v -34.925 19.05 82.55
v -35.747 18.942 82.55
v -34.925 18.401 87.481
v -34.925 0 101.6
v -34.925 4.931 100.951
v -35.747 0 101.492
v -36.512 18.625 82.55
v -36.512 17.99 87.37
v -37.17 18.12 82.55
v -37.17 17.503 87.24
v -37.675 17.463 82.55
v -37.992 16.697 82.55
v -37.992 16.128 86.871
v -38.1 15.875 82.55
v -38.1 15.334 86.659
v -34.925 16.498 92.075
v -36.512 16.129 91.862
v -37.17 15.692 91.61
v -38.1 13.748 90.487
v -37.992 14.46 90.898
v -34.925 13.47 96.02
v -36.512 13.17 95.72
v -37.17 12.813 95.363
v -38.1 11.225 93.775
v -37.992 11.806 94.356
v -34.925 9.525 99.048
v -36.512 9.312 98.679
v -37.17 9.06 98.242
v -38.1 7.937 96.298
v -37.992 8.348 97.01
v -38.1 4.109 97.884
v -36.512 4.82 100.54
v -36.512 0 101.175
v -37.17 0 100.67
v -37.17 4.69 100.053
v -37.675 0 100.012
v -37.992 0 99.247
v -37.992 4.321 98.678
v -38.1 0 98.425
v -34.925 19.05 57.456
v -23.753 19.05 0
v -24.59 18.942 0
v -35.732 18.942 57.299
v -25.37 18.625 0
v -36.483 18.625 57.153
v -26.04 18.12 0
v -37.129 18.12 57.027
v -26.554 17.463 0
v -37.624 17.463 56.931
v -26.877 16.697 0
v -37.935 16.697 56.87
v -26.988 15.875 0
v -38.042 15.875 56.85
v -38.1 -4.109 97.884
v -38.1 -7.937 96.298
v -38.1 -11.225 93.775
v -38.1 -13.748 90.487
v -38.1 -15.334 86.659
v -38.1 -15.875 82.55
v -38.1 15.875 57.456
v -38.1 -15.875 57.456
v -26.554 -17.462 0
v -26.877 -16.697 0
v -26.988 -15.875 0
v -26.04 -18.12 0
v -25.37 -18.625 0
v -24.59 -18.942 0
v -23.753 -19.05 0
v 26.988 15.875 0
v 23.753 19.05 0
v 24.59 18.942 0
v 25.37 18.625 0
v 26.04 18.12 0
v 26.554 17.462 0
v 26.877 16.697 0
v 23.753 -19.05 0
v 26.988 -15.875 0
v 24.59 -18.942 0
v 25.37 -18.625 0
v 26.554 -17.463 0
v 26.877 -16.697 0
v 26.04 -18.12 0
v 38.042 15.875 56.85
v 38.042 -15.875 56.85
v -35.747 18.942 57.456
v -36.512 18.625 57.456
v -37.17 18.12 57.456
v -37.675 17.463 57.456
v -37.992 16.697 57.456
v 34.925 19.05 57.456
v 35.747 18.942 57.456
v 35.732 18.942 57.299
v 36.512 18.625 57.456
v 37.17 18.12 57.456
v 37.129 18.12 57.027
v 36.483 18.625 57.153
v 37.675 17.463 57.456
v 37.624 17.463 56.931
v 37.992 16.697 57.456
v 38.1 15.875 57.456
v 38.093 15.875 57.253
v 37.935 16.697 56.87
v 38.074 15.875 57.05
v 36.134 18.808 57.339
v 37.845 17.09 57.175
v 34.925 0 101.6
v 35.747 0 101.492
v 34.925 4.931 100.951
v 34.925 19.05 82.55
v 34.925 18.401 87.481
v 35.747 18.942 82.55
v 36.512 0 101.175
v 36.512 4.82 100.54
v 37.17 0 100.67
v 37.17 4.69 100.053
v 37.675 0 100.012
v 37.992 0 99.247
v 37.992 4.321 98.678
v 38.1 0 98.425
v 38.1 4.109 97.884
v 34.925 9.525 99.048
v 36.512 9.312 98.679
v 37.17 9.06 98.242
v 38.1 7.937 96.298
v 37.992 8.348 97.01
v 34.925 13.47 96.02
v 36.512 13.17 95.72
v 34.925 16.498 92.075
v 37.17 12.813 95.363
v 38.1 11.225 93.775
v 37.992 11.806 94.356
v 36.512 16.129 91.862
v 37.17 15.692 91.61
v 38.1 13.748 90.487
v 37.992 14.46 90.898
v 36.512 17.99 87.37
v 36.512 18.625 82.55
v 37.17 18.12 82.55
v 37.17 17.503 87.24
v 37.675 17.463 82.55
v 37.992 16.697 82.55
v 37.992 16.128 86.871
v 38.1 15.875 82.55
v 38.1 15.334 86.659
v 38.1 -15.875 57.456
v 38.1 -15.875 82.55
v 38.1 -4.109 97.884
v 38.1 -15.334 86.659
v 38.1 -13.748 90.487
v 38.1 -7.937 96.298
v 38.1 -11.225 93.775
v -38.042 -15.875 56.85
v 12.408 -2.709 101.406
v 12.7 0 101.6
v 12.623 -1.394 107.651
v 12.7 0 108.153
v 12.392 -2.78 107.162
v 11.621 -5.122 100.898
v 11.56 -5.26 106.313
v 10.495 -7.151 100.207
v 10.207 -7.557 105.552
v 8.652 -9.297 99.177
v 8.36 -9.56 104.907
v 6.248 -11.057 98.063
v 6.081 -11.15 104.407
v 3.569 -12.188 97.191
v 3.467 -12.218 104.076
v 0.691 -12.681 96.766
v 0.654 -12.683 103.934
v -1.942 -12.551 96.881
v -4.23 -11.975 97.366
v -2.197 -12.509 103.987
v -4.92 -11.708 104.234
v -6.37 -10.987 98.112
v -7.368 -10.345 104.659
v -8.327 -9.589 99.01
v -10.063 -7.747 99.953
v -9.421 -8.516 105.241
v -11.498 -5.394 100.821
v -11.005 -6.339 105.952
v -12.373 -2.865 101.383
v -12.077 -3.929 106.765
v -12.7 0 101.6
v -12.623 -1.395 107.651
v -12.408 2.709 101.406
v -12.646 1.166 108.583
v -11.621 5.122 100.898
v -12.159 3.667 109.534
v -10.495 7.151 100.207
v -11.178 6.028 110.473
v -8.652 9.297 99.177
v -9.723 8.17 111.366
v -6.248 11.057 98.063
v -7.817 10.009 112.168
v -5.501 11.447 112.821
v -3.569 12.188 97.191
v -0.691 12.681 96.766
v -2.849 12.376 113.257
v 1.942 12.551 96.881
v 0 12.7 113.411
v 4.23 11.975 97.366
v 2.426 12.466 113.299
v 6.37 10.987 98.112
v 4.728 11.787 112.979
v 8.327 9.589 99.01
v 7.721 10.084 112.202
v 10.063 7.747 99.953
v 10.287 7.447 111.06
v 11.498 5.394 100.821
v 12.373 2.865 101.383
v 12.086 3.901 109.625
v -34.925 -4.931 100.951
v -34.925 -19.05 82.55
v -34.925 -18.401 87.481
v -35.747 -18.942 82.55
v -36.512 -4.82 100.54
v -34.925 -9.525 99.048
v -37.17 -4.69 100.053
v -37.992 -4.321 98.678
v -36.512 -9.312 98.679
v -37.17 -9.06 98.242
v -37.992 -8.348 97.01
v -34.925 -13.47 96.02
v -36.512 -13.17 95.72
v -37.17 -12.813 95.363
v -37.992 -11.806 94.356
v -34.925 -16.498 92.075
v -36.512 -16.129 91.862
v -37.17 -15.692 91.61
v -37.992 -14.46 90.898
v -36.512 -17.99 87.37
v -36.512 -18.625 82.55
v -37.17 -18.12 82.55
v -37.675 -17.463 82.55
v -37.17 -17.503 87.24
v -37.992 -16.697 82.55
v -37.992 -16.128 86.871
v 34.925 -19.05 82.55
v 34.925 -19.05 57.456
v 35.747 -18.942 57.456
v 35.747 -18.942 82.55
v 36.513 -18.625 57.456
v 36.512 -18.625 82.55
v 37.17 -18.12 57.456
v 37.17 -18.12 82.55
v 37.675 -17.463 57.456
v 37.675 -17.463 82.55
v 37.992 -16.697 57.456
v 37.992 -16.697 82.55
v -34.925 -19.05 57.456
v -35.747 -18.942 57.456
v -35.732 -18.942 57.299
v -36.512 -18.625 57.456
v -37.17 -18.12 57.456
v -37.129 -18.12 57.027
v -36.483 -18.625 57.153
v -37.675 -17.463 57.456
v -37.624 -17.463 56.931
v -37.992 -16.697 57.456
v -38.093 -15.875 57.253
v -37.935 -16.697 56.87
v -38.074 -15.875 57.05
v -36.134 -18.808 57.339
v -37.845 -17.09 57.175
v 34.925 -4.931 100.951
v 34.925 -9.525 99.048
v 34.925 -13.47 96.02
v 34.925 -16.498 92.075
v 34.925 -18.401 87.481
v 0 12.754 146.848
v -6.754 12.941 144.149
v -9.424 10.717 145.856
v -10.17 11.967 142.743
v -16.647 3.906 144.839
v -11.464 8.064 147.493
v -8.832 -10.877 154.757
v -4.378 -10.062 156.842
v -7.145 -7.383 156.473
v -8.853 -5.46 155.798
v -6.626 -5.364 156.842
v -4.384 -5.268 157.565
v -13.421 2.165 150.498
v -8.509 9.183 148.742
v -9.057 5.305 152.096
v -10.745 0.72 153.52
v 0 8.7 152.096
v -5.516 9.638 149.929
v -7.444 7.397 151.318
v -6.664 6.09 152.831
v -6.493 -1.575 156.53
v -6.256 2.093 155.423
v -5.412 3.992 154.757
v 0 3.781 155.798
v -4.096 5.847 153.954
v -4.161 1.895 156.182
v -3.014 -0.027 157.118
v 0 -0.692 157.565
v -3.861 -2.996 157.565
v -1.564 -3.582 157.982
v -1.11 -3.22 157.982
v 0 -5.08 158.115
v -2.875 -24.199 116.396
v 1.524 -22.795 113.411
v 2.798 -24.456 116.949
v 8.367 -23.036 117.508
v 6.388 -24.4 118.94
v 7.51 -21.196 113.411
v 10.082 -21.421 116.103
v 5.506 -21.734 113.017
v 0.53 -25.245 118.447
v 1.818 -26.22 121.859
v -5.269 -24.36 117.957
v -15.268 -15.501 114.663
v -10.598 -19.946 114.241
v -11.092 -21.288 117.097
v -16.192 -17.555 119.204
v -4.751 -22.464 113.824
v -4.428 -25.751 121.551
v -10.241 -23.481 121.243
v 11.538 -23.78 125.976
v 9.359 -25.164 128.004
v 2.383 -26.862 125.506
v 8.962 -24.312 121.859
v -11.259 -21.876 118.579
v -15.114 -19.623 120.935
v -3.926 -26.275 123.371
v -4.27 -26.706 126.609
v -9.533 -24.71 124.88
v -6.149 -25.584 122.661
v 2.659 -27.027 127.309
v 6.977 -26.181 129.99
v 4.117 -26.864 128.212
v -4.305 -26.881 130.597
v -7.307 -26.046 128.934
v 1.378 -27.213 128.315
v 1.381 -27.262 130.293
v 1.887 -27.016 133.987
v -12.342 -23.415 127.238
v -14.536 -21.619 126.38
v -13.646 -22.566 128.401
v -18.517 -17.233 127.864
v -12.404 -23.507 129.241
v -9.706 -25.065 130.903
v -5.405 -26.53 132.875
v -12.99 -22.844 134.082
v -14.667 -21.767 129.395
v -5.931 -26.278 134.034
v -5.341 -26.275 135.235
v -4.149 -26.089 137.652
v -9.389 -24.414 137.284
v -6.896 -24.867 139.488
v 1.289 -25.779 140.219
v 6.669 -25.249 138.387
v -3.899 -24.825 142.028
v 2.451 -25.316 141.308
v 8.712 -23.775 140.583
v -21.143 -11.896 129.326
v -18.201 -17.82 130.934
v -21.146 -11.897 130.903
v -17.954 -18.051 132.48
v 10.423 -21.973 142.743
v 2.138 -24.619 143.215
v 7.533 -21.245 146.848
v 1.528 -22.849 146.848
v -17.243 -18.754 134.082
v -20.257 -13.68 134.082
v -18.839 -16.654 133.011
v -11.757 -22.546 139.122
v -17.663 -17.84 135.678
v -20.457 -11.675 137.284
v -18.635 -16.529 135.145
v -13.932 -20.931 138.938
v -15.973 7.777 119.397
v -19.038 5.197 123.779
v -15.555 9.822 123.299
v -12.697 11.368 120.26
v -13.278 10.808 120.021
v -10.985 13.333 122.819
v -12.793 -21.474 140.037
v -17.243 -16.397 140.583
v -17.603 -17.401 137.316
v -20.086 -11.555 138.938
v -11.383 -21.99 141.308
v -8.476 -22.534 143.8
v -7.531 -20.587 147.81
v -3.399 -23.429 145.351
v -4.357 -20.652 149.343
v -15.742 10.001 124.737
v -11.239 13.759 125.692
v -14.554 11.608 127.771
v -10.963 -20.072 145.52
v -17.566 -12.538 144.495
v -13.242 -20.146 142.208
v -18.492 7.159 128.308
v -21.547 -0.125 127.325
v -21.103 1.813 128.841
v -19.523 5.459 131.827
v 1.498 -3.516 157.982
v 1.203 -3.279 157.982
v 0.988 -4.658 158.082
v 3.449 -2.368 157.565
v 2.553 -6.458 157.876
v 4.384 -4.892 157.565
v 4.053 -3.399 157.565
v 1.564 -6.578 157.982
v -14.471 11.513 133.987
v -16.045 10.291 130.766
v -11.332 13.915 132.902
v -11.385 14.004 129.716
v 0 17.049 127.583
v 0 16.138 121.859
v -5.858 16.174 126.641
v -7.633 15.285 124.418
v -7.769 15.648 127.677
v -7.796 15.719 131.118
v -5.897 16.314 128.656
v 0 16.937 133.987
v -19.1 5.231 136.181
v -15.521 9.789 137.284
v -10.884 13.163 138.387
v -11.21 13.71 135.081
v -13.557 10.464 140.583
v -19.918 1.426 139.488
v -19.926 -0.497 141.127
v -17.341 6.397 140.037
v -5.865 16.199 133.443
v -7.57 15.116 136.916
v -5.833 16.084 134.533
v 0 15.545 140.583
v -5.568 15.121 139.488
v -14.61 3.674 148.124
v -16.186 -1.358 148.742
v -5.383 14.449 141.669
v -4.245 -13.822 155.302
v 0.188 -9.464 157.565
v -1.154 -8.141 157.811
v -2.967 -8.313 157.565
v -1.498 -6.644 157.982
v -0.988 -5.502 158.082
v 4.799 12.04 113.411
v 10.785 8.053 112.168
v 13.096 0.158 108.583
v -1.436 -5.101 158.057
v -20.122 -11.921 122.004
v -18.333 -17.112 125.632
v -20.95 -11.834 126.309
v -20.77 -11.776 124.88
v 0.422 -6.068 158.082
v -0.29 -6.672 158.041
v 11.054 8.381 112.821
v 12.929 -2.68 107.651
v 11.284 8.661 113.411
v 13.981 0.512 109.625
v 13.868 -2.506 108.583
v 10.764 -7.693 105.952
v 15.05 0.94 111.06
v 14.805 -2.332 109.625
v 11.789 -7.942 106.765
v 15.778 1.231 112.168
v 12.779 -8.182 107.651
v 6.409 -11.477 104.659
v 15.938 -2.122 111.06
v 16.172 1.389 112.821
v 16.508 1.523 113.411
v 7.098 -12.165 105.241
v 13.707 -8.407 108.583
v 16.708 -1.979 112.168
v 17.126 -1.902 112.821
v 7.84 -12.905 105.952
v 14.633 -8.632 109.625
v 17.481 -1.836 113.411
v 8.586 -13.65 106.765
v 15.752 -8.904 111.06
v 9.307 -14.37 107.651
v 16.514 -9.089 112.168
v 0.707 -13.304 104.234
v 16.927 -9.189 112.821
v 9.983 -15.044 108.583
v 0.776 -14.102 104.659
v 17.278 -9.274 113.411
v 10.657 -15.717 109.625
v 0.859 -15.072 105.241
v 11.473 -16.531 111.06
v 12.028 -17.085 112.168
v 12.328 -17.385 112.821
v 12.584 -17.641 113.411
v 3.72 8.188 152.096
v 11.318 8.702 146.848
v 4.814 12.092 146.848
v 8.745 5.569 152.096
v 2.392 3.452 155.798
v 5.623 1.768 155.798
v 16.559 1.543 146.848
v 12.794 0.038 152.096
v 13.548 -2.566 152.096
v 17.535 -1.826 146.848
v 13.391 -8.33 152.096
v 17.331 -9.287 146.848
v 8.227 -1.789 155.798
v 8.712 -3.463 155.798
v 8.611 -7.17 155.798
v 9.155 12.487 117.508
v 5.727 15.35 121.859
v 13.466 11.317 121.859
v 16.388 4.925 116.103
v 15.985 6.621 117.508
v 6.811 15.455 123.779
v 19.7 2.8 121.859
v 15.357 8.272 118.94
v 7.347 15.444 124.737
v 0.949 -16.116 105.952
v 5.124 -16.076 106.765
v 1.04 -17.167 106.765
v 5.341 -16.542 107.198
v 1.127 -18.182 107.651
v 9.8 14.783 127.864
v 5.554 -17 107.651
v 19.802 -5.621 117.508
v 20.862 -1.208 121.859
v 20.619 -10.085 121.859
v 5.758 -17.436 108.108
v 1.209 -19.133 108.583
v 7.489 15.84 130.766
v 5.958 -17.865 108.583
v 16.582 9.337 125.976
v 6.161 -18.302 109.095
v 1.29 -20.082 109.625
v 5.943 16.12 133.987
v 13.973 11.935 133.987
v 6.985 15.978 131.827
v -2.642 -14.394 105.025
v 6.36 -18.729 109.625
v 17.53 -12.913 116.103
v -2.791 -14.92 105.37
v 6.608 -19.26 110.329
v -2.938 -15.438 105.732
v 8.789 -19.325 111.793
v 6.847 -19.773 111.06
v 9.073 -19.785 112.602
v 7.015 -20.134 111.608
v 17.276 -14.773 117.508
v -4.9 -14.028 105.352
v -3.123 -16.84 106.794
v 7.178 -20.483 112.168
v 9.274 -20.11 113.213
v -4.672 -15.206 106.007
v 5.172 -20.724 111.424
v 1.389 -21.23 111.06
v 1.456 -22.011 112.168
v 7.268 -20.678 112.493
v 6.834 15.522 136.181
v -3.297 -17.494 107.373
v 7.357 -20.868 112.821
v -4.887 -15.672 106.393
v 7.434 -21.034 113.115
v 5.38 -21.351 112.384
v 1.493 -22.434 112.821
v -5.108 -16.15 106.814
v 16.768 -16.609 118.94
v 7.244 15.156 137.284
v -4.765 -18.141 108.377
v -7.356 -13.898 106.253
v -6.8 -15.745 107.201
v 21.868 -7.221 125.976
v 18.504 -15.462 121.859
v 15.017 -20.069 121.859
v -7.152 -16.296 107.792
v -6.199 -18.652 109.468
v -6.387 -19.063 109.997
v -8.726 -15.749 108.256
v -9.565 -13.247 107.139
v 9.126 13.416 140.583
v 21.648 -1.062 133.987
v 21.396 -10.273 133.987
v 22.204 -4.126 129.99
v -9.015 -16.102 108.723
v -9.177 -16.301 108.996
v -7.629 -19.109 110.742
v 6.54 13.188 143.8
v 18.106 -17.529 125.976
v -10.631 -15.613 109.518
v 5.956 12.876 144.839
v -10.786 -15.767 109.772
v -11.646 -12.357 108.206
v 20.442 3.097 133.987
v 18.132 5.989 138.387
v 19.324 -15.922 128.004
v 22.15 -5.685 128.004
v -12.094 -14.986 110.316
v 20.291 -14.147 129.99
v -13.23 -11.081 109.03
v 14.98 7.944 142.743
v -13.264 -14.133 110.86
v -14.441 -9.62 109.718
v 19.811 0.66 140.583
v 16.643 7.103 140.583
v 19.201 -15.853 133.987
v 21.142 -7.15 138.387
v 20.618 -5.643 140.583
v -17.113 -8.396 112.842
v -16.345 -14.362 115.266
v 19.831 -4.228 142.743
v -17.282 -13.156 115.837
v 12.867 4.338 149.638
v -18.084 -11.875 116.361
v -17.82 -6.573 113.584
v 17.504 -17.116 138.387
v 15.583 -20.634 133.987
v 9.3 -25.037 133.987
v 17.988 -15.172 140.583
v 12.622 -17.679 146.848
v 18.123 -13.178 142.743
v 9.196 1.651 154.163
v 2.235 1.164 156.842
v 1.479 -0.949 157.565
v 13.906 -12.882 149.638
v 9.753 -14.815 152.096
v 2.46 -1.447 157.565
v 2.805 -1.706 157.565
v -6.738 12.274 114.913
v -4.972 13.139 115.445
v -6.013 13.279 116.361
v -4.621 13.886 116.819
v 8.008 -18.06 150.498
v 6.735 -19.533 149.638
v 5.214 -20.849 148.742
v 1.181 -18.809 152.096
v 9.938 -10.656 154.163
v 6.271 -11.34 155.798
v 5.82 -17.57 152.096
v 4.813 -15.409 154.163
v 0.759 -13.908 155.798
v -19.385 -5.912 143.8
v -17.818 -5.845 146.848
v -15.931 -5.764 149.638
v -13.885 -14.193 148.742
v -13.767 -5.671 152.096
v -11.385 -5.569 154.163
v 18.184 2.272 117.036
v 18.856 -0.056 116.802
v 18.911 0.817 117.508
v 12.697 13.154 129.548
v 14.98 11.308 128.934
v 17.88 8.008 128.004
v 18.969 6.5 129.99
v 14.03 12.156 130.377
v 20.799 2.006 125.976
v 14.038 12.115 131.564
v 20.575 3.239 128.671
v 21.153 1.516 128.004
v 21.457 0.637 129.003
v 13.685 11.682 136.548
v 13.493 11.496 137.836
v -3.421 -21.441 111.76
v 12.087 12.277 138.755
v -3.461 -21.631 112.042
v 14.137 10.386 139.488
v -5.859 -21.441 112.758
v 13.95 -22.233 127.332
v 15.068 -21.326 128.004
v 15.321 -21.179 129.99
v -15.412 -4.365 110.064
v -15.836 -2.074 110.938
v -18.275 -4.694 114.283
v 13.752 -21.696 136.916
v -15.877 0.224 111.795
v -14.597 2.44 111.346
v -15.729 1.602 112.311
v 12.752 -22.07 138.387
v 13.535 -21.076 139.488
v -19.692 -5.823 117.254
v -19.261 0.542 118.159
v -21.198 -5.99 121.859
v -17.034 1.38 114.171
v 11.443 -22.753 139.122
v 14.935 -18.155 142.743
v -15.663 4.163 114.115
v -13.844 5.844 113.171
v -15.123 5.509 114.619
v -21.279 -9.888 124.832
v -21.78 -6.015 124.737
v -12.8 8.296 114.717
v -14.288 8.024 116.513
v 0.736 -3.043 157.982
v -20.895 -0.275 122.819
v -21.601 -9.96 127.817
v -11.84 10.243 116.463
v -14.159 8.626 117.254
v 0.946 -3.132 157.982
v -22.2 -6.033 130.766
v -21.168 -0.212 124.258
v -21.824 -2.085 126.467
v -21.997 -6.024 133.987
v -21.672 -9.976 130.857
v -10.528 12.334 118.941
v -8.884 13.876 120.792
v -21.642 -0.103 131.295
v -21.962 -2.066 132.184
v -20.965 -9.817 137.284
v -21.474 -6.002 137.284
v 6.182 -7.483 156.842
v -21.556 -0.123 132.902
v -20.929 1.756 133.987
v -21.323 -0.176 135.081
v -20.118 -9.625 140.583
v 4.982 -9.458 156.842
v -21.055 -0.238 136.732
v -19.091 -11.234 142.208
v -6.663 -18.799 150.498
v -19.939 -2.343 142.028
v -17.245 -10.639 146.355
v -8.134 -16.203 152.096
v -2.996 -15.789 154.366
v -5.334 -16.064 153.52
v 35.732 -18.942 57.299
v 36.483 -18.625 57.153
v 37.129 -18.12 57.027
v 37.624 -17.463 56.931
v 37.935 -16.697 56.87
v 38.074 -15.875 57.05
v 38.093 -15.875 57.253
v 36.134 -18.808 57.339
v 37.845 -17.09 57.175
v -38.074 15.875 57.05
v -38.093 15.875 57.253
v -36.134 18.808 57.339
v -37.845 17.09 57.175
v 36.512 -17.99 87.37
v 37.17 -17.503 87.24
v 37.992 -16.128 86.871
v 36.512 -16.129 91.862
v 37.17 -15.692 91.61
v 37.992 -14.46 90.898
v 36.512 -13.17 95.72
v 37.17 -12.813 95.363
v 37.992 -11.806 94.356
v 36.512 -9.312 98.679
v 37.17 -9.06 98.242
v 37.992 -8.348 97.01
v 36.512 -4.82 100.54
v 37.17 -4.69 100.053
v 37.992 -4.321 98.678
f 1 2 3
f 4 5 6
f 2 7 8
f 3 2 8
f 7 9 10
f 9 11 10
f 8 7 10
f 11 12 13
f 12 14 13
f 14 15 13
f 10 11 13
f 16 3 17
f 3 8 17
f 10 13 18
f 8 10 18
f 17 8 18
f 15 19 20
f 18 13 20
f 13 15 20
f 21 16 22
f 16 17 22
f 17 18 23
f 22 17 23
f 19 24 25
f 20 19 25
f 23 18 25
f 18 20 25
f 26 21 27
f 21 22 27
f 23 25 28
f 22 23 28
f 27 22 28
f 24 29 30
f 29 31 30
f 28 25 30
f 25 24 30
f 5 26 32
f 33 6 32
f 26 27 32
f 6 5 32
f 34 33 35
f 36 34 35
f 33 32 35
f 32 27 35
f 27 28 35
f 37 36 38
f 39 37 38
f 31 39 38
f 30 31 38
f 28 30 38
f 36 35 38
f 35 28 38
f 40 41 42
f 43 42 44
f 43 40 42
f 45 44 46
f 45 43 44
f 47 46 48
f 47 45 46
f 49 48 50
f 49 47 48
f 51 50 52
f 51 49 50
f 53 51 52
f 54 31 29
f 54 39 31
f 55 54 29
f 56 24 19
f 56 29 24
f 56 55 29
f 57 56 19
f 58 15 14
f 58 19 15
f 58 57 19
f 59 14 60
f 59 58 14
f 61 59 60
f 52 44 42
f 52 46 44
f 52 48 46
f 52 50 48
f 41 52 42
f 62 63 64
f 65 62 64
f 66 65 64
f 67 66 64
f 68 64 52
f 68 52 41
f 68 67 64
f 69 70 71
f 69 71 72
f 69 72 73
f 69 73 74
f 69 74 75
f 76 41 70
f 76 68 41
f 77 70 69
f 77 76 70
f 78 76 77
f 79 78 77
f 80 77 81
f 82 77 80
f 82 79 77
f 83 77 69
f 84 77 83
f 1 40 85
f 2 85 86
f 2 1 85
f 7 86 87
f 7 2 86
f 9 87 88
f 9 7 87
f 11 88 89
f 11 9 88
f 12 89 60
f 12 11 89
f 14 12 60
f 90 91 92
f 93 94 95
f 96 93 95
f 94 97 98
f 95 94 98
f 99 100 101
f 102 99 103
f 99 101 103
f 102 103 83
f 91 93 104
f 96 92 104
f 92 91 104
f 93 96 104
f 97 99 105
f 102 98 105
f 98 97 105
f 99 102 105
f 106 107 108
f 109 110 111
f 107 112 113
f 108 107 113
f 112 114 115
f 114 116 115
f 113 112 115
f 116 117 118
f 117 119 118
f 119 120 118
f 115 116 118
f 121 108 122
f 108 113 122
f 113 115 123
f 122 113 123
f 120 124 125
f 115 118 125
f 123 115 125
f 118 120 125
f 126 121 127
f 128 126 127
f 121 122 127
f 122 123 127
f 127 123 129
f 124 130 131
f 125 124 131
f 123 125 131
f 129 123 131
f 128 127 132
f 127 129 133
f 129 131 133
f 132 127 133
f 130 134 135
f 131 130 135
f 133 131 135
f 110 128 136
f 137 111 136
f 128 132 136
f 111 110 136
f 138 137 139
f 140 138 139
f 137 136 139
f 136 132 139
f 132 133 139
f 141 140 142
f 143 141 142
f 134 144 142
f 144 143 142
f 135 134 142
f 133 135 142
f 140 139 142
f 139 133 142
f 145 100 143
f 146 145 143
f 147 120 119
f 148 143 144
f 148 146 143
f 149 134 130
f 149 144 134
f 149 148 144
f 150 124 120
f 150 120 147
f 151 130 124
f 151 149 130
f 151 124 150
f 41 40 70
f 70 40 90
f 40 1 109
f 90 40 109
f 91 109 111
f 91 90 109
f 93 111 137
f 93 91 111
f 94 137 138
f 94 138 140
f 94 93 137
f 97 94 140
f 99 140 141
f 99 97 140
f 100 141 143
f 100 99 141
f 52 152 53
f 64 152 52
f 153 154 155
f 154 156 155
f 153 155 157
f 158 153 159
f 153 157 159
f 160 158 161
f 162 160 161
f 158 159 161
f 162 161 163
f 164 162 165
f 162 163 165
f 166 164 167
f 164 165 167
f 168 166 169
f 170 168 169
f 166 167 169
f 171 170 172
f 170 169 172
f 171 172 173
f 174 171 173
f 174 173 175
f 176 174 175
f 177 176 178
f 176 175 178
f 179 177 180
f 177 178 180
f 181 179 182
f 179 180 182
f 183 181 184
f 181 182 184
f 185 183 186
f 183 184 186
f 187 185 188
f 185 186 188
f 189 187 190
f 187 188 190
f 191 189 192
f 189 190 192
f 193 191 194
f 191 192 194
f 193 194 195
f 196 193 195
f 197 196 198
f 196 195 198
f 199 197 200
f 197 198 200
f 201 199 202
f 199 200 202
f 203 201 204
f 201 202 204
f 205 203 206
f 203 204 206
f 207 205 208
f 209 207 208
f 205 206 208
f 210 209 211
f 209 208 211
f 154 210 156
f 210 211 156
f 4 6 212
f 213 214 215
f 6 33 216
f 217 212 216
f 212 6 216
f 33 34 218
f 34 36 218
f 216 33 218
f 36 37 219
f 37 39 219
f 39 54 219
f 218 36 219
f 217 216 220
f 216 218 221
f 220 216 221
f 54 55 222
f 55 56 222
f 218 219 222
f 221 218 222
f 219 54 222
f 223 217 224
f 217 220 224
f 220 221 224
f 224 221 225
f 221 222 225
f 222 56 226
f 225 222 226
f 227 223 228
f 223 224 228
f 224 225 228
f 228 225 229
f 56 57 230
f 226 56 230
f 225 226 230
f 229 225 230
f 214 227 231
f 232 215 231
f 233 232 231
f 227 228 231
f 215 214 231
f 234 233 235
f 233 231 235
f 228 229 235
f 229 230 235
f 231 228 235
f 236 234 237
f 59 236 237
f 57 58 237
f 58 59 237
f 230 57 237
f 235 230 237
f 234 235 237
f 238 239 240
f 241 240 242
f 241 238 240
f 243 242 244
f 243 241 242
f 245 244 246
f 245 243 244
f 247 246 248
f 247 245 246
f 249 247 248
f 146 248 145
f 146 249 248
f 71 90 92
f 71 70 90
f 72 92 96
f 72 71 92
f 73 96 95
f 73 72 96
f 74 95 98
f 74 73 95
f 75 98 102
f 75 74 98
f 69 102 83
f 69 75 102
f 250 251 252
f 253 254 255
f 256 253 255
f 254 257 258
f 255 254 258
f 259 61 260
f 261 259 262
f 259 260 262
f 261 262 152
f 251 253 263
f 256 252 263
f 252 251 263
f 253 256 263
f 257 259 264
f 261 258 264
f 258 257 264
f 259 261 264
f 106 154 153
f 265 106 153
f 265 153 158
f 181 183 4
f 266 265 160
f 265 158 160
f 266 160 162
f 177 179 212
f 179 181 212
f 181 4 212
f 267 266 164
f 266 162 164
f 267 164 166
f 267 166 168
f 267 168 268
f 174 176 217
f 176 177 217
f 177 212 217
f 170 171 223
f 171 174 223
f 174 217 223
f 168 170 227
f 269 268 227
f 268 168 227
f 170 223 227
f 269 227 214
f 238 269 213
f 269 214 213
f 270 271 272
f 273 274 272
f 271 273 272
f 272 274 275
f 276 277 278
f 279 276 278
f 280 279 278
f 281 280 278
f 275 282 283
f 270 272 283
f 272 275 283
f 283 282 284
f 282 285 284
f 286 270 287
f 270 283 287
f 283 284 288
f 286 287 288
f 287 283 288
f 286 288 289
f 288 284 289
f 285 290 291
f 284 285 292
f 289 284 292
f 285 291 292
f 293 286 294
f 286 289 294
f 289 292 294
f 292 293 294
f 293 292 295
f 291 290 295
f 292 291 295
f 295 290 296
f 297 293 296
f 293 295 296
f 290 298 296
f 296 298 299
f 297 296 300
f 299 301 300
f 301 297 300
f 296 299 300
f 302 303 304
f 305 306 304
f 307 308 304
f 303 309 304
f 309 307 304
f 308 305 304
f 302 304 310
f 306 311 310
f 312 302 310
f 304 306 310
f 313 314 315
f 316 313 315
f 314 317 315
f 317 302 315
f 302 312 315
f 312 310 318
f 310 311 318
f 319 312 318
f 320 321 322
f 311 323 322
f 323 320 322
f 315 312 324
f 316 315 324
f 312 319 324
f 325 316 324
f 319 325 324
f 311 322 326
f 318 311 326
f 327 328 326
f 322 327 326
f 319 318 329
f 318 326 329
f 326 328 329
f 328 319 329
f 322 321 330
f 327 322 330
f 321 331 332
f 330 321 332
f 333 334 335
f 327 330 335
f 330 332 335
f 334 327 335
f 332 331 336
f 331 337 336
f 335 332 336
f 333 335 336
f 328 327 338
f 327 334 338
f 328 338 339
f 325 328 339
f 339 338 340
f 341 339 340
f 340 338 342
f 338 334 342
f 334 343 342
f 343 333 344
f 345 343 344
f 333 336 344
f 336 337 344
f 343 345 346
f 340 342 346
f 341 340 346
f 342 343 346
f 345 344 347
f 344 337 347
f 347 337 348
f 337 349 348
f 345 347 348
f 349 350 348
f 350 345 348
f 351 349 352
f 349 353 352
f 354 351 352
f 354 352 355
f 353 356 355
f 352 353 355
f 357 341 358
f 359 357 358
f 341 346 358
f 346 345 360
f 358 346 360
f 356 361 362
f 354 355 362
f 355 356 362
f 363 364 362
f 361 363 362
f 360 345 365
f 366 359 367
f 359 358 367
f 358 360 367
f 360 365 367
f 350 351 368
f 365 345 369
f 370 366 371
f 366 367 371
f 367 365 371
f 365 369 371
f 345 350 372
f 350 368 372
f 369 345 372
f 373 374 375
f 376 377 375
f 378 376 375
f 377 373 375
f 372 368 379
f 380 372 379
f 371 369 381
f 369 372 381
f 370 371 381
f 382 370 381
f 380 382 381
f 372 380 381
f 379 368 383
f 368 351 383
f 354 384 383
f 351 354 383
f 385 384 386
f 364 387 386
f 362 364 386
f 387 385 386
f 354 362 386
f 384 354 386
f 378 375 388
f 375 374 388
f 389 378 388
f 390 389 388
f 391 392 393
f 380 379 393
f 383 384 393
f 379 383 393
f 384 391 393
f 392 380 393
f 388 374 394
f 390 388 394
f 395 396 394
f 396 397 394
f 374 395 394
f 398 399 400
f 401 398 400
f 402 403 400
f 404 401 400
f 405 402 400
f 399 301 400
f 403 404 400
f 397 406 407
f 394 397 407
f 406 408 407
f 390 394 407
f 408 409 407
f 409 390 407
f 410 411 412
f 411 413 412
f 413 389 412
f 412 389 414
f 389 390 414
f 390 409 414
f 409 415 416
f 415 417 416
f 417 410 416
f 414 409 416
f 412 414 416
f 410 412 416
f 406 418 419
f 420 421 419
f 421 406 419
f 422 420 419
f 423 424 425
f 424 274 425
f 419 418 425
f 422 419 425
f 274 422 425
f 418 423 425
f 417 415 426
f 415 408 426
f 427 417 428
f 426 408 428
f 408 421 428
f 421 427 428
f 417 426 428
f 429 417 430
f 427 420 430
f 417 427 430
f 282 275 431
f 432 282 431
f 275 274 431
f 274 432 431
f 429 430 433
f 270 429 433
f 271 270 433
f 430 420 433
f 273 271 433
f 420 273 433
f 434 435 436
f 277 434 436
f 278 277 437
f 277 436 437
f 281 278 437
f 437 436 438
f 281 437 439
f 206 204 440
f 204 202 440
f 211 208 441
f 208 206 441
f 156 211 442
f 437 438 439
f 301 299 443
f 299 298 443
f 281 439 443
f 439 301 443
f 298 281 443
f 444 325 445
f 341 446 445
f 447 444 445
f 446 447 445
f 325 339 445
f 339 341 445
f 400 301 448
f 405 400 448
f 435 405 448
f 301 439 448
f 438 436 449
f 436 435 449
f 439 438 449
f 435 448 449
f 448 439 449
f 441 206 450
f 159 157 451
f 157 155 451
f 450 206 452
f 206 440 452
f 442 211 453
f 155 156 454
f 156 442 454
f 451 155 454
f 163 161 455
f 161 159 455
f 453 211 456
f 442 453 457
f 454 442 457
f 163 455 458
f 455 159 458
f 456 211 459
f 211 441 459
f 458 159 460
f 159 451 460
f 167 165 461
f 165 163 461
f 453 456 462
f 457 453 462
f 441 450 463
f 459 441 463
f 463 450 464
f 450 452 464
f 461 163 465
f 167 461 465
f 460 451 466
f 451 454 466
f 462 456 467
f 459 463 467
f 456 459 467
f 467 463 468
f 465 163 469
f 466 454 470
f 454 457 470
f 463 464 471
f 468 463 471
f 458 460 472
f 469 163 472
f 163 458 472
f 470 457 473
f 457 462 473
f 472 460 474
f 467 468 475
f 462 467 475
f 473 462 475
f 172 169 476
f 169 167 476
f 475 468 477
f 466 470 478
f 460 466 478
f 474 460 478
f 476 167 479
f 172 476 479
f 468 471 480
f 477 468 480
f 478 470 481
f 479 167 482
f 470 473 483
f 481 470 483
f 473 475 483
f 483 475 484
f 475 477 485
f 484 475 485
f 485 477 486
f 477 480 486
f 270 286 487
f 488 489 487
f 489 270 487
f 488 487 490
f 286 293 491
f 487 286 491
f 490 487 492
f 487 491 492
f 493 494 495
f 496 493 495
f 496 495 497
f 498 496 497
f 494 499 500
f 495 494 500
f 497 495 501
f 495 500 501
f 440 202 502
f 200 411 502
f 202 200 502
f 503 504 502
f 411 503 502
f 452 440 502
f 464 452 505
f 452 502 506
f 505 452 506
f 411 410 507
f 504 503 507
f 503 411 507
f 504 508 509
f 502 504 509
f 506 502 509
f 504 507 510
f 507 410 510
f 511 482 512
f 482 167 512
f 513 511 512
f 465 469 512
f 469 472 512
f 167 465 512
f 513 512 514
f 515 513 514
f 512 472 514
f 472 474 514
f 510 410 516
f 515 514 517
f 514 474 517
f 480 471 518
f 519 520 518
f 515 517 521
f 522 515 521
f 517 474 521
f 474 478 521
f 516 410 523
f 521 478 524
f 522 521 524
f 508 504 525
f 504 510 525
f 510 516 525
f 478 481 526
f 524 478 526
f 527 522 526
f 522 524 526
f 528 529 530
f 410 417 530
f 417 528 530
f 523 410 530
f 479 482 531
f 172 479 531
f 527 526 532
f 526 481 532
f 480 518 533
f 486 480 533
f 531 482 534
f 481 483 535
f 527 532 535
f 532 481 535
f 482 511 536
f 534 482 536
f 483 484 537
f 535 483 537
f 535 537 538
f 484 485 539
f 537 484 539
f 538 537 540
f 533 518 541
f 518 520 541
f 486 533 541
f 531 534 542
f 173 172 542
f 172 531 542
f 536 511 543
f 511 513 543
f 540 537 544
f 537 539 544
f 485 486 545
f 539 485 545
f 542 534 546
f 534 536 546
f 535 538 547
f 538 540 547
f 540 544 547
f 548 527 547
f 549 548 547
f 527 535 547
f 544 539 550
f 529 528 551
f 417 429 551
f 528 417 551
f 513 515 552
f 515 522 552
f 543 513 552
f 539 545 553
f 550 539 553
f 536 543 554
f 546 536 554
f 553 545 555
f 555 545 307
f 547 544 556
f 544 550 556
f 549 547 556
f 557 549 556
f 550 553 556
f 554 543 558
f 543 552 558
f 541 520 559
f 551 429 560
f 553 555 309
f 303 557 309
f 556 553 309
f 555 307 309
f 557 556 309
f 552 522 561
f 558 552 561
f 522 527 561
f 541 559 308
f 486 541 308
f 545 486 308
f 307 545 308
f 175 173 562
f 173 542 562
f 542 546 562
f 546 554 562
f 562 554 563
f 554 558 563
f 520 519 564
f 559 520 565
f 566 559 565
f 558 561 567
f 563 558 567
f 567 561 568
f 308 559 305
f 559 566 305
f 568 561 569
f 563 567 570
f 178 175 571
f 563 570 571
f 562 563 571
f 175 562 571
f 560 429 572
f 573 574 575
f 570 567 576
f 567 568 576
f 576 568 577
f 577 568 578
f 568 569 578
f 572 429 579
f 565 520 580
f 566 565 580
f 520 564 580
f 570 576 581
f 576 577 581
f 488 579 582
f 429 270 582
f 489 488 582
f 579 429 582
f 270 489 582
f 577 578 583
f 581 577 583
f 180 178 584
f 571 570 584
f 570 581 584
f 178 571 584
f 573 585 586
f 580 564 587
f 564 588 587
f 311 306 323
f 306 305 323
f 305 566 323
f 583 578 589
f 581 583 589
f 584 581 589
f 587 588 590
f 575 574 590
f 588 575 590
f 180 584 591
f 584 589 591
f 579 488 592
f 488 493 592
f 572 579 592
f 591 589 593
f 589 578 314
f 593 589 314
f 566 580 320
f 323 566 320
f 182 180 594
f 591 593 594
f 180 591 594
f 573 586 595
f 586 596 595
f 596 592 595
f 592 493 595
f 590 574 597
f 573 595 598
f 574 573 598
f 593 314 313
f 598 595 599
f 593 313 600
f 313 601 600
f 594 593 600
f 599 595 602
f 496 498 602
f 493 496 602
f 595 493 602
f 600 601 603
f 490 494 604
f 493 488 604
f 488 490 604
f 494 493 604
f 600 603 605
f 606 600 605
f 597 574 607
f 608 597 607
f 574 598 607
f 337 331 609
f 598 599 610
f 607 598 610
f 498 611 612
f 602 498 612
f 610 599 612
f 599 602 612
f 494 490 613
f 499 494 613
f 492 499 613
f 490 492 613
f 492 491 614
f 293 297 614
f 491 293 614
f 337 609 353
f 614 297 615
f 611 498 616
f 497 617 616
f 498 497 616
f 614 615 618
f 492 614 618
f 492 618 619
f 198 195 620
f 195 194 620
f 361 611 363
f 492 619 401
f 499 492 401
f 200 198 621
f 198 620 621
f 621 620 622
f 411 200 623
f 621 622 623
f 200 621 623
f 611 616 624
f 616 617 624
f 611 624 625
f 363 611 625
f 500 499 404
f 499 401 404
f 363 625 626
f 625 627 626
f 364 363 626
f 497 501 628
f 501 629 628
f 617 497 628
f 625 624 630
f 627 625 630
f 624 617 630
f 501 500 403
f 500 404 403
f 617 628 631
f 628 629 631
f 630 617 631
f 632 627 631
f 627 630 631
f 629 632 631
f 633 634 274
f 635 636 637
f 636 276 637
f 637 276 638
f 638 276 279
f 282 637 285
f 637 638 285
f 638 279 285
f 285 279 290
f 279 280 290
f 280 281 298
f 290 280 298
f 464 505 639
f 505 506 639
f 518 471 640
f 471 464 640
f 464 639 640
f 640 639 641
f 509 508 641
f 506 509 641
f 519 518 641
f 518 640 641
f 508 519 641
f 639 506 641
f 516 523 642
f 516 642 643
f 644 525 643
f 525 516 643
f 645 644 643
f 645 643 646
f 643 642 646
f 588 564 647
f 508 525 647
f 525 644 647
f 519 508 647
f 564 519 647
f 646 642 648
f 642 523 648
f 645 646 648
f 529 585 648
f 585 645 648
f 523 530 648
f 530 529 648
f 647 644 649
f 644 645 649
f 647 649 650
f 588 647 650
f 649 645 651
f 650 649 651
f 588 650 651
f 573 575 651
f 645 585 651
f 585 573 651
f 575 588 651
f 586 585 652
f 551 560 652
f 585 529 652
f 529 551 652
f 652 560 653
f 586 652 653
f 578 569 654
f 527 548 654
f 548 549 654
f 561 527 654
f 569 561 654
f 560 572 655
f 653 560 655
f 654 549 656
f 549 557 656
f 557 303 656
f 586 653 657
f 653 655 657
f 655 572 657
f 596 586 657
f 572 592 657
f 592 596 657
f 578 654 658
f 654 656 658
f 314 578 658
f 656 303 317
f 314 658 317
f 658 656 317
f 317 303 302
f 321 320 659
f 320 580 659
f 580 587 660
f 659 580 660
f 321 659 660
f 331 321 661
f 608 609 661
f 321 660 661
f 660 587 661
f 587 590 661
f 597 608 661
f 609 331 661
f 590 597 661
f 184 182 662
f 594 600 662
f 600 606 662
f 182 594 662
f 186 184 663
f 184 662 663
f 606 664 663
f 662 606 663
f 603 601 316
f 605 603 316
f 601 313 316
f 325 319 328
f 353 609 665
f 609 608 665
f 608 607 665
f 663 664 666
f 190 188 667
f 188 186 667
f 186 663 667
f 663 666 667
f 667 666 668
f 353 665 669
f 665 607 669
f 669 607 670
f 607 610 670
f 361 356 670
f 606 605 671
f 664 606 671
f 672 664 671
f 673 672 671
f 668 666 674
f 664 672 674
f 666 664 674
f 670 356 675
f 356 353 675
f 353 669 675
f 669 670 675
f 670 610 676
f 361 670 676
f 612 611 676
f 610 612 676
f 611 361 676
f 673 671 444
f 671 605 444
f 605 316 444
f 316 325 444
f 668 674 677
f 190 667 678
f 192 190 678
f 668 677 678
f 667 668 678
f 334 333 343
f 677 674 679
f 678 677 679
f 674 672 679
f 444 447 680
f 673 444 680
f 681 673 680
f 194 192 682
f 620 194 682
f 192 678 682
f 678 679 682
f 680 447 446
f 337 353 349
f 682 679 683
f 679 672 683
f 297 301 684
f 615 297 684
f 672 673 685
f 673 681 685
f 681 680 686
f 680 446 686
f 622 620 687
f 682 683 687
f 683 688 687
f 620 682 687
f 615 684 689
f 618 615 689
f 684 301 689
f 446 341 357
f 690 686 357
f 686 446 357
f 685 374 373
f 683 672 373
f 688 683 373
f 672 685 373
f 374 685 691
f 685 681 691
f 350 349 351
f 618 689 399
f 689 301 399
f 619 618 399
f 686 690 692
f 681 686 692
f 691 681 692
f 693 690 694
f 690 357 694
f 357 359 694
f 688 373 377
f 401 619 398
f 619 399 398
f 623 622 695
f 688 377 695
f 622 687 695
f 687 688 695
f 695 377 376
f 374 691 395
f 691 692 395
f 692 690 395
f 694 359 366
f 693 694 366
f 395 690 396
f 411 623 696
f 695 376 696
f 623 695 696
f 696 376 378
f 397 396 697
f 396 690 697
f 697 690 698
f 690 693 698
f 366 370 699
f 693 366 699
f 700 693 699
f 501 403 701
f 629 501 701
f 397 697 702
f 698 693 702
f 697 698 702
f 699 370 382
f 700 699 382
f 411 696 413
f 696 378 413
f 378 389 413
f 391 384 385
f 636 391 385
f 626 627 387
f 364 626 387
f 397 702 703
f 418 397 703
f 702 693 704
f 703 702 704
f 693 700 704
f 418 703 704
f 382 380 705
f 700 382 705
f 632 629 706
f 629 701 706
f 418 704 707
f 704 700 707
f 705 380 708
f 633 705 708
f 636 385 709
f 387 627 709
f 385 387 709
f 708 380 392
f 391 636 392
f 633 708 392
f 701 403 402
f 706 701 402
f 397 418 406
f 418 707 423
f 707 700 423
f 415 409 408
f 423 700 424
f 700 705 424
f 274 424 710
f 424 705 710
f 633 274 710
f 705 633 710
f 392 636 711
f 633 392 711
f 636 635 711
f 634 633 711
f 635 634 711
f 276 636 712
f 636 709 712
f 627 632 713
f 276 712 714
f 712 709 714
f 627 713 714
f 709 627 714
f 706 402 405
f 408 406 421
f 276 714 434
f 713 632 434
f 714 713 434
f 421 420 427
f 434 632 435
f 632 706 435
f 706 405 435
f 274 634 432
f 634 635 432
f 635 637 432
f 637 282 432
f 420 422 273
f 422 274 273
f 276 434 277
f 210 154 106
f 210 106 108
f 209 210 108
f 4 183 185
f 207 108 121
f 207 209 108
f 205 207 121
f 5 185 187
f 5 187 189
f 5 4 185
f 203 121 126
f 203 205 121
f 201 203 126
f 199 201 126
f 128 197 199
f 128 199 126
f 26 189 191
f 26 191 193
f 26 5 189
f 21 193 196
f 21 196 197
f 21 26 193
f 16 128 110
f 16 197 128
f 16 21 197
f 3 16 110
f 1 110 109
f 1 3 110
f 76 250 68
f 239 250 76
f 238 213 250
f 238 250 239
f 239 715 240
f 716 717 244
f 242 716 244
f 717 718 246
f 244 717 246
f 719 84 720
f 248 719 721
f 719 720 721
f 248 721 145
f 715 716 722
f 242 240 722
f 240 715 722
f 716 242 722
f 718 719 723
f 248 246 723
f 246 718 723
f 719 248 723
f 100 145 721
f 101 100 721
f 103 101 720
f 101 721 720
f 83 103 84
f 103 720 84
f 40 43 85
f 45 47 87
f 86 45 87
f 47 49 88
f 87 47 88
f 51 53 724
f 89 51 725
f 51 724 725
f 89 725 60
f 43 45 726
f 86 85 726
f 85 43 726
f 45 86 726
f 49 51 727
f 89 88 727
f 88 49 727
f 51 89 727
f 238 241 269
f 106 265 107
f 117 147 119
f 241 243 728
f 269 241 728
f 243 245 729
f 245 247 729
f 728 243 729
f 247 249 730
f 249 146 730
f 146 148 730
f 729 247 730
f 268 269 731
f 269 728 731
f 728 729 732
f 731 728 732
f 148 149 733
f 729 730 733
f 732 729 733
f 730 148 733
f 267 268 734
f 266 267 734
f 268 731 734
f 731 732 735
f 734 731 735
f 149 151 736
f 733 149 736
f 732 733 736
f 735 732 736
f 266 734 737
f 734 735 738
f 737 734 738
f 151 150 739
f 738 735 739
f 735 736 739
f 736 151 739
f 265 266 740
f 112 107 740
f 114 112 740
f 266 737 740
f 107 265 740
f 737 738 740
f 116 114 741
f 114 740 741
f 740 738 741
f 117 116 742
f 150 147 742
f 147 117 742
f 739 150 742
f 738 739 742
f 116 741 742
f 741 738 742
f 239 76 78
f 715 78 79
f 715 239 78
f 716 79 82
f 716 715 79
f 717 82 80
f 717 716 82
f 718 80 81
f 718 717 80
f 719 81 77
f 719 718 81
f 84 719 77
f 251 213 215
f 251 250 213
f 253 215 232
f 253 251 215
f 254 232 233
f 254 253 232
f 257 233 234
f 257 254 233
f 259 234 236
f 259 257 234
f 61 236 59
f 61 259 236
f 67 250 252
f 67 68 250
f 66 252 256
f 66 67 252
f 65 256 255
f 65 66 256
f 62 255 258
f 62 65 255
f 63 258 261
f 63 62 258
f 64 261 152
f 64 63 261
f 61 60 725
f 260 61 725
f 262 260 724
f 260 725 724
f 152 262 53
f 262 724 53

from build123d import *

# Parameters (mm, degrees)
F1_DEPTH    = 19.05
F2_T1_DEPTH = 171.45
F3_W        = 12.7
F3_H        = 38.1
F7_R        = 3.175
F8_R        = 3.175


# Not quite as in the source:
# - a fillet or chamfer that OpenCascade refuses, or shapes differently, is made with other operations: its cross-section is extruded or revolved along the edge and cut away or added


with BuildPart() as f1:
    # F0 (on Front) → F1 (new body, symmetric)
    with BuildSketch(Plane.XZ):
        Polygon((-38.1, 57.15), (-26.9875, 0), (26.9875, 0), (38.1, 57.15), (38.1, 101.6), (-38.1, 101.6), align=None)
    extrude(amount=F1_DEPTH, both=True)

    # F2: fillet of radius 19.05 on 2 edges, made by hand

    # F2_s2 → F2_t1 (cut)
    with BuildSketch(Plane.YZ.offset(-85.725)):
        with BuildLine():
            ThreePointArc((0, 101.6), (-13.4703841816, 96.0203841816), (-19.05, 82.55))
            Line((-19.05, 82.55), (-19.05, 101.6))
            Line((-19.05, 101.6), (0, 101.6))
        make_face()
        with BuildLine():
            ThreePointArc((0, 101.6), (13.4703841816, 96.0203841816), (19.05, 82.55))
            Line((19.05, 82.55), (19.05, 101.6))
            Line((19.05, 101.6), (0, 101.6))
        make_face()
    extrude(amount=F2_T1_DEPTH, mode=Mode.SUBTRACT)

    # F3 (on Front) → F4 (revolve)
    with BuildSketch(Plane.XZ):
        with Locations((6.35, 101.6)):
            Rectangle(F3_W, F3_H)
    revolve(axis=Axis((0, 0, 41.275), (0, 0, -1)))

    # F5 (on Right) → F6 (revolve)
    with BuildSketch(Plane.YZ):
        with BuildLine():
            Line((-5.08, 158.115), (-5.08, 102.235))
            add(Edge.make_bspline(
                [(-5.08, 102.235), (17.145, 102.235), (17.145, 130.175), (17.145, 158.115), (-5.08, 158.115)],
                knots=[3.1415926536, 3.1415926536, 3.1415926536, 4.7123889804, 4.7123889804, 6.2831853072, 6.2831853072, 6.2831853072], degree=2, weights=[1, 0.7071067812, 1, 0.7071067812, 1]))
        make_face()
    revolve(axis=Axis((0, -5.08, 55.275326029), (0, 0, -1)))

    # F7
    f7_edges = [f1.edges().sort_by_distance(p)[0] for p in [
        (-38.1, 0, 57.15),
        (38.1, 0, 57.15),
    ]]
    fillet(f7_edges, radius=F7_R)

    # F8
    f8_edges = [f1.edges().sort_by_distance(p)[0] for p in [
        (32.514564, -19.05, 28.424903),
        (-32.514564, -19.05, 28.424903),
        (-32.514564, 19.05, 28.424903),
        (-38.1, 19.05, 70.002908),
        (-38.085374, 19.05, 57.151409),
        (38.1, 19.05, 70.002908),
        (38.085374, 19.05, 57.151409),
        (32.514564, 19.05, 28.424903),
        (-38.085374, -19.05, 57.151409),
        (-38.1, -19.05, 70.002908),
        (38.1, -19.05, 70.002908),
        (38.085374, -19.05, 57.151409),
        (-38.1, -13.470384, 96.020384),
        (-38.1, 13.470384, 96.020384),
        (38.1, 13.470384, 96.020384),
        (38.1, -13.470384, 96.020384),
    ]]
    fillet(f8_edges, radius=F8_R)


solid = f1.part
